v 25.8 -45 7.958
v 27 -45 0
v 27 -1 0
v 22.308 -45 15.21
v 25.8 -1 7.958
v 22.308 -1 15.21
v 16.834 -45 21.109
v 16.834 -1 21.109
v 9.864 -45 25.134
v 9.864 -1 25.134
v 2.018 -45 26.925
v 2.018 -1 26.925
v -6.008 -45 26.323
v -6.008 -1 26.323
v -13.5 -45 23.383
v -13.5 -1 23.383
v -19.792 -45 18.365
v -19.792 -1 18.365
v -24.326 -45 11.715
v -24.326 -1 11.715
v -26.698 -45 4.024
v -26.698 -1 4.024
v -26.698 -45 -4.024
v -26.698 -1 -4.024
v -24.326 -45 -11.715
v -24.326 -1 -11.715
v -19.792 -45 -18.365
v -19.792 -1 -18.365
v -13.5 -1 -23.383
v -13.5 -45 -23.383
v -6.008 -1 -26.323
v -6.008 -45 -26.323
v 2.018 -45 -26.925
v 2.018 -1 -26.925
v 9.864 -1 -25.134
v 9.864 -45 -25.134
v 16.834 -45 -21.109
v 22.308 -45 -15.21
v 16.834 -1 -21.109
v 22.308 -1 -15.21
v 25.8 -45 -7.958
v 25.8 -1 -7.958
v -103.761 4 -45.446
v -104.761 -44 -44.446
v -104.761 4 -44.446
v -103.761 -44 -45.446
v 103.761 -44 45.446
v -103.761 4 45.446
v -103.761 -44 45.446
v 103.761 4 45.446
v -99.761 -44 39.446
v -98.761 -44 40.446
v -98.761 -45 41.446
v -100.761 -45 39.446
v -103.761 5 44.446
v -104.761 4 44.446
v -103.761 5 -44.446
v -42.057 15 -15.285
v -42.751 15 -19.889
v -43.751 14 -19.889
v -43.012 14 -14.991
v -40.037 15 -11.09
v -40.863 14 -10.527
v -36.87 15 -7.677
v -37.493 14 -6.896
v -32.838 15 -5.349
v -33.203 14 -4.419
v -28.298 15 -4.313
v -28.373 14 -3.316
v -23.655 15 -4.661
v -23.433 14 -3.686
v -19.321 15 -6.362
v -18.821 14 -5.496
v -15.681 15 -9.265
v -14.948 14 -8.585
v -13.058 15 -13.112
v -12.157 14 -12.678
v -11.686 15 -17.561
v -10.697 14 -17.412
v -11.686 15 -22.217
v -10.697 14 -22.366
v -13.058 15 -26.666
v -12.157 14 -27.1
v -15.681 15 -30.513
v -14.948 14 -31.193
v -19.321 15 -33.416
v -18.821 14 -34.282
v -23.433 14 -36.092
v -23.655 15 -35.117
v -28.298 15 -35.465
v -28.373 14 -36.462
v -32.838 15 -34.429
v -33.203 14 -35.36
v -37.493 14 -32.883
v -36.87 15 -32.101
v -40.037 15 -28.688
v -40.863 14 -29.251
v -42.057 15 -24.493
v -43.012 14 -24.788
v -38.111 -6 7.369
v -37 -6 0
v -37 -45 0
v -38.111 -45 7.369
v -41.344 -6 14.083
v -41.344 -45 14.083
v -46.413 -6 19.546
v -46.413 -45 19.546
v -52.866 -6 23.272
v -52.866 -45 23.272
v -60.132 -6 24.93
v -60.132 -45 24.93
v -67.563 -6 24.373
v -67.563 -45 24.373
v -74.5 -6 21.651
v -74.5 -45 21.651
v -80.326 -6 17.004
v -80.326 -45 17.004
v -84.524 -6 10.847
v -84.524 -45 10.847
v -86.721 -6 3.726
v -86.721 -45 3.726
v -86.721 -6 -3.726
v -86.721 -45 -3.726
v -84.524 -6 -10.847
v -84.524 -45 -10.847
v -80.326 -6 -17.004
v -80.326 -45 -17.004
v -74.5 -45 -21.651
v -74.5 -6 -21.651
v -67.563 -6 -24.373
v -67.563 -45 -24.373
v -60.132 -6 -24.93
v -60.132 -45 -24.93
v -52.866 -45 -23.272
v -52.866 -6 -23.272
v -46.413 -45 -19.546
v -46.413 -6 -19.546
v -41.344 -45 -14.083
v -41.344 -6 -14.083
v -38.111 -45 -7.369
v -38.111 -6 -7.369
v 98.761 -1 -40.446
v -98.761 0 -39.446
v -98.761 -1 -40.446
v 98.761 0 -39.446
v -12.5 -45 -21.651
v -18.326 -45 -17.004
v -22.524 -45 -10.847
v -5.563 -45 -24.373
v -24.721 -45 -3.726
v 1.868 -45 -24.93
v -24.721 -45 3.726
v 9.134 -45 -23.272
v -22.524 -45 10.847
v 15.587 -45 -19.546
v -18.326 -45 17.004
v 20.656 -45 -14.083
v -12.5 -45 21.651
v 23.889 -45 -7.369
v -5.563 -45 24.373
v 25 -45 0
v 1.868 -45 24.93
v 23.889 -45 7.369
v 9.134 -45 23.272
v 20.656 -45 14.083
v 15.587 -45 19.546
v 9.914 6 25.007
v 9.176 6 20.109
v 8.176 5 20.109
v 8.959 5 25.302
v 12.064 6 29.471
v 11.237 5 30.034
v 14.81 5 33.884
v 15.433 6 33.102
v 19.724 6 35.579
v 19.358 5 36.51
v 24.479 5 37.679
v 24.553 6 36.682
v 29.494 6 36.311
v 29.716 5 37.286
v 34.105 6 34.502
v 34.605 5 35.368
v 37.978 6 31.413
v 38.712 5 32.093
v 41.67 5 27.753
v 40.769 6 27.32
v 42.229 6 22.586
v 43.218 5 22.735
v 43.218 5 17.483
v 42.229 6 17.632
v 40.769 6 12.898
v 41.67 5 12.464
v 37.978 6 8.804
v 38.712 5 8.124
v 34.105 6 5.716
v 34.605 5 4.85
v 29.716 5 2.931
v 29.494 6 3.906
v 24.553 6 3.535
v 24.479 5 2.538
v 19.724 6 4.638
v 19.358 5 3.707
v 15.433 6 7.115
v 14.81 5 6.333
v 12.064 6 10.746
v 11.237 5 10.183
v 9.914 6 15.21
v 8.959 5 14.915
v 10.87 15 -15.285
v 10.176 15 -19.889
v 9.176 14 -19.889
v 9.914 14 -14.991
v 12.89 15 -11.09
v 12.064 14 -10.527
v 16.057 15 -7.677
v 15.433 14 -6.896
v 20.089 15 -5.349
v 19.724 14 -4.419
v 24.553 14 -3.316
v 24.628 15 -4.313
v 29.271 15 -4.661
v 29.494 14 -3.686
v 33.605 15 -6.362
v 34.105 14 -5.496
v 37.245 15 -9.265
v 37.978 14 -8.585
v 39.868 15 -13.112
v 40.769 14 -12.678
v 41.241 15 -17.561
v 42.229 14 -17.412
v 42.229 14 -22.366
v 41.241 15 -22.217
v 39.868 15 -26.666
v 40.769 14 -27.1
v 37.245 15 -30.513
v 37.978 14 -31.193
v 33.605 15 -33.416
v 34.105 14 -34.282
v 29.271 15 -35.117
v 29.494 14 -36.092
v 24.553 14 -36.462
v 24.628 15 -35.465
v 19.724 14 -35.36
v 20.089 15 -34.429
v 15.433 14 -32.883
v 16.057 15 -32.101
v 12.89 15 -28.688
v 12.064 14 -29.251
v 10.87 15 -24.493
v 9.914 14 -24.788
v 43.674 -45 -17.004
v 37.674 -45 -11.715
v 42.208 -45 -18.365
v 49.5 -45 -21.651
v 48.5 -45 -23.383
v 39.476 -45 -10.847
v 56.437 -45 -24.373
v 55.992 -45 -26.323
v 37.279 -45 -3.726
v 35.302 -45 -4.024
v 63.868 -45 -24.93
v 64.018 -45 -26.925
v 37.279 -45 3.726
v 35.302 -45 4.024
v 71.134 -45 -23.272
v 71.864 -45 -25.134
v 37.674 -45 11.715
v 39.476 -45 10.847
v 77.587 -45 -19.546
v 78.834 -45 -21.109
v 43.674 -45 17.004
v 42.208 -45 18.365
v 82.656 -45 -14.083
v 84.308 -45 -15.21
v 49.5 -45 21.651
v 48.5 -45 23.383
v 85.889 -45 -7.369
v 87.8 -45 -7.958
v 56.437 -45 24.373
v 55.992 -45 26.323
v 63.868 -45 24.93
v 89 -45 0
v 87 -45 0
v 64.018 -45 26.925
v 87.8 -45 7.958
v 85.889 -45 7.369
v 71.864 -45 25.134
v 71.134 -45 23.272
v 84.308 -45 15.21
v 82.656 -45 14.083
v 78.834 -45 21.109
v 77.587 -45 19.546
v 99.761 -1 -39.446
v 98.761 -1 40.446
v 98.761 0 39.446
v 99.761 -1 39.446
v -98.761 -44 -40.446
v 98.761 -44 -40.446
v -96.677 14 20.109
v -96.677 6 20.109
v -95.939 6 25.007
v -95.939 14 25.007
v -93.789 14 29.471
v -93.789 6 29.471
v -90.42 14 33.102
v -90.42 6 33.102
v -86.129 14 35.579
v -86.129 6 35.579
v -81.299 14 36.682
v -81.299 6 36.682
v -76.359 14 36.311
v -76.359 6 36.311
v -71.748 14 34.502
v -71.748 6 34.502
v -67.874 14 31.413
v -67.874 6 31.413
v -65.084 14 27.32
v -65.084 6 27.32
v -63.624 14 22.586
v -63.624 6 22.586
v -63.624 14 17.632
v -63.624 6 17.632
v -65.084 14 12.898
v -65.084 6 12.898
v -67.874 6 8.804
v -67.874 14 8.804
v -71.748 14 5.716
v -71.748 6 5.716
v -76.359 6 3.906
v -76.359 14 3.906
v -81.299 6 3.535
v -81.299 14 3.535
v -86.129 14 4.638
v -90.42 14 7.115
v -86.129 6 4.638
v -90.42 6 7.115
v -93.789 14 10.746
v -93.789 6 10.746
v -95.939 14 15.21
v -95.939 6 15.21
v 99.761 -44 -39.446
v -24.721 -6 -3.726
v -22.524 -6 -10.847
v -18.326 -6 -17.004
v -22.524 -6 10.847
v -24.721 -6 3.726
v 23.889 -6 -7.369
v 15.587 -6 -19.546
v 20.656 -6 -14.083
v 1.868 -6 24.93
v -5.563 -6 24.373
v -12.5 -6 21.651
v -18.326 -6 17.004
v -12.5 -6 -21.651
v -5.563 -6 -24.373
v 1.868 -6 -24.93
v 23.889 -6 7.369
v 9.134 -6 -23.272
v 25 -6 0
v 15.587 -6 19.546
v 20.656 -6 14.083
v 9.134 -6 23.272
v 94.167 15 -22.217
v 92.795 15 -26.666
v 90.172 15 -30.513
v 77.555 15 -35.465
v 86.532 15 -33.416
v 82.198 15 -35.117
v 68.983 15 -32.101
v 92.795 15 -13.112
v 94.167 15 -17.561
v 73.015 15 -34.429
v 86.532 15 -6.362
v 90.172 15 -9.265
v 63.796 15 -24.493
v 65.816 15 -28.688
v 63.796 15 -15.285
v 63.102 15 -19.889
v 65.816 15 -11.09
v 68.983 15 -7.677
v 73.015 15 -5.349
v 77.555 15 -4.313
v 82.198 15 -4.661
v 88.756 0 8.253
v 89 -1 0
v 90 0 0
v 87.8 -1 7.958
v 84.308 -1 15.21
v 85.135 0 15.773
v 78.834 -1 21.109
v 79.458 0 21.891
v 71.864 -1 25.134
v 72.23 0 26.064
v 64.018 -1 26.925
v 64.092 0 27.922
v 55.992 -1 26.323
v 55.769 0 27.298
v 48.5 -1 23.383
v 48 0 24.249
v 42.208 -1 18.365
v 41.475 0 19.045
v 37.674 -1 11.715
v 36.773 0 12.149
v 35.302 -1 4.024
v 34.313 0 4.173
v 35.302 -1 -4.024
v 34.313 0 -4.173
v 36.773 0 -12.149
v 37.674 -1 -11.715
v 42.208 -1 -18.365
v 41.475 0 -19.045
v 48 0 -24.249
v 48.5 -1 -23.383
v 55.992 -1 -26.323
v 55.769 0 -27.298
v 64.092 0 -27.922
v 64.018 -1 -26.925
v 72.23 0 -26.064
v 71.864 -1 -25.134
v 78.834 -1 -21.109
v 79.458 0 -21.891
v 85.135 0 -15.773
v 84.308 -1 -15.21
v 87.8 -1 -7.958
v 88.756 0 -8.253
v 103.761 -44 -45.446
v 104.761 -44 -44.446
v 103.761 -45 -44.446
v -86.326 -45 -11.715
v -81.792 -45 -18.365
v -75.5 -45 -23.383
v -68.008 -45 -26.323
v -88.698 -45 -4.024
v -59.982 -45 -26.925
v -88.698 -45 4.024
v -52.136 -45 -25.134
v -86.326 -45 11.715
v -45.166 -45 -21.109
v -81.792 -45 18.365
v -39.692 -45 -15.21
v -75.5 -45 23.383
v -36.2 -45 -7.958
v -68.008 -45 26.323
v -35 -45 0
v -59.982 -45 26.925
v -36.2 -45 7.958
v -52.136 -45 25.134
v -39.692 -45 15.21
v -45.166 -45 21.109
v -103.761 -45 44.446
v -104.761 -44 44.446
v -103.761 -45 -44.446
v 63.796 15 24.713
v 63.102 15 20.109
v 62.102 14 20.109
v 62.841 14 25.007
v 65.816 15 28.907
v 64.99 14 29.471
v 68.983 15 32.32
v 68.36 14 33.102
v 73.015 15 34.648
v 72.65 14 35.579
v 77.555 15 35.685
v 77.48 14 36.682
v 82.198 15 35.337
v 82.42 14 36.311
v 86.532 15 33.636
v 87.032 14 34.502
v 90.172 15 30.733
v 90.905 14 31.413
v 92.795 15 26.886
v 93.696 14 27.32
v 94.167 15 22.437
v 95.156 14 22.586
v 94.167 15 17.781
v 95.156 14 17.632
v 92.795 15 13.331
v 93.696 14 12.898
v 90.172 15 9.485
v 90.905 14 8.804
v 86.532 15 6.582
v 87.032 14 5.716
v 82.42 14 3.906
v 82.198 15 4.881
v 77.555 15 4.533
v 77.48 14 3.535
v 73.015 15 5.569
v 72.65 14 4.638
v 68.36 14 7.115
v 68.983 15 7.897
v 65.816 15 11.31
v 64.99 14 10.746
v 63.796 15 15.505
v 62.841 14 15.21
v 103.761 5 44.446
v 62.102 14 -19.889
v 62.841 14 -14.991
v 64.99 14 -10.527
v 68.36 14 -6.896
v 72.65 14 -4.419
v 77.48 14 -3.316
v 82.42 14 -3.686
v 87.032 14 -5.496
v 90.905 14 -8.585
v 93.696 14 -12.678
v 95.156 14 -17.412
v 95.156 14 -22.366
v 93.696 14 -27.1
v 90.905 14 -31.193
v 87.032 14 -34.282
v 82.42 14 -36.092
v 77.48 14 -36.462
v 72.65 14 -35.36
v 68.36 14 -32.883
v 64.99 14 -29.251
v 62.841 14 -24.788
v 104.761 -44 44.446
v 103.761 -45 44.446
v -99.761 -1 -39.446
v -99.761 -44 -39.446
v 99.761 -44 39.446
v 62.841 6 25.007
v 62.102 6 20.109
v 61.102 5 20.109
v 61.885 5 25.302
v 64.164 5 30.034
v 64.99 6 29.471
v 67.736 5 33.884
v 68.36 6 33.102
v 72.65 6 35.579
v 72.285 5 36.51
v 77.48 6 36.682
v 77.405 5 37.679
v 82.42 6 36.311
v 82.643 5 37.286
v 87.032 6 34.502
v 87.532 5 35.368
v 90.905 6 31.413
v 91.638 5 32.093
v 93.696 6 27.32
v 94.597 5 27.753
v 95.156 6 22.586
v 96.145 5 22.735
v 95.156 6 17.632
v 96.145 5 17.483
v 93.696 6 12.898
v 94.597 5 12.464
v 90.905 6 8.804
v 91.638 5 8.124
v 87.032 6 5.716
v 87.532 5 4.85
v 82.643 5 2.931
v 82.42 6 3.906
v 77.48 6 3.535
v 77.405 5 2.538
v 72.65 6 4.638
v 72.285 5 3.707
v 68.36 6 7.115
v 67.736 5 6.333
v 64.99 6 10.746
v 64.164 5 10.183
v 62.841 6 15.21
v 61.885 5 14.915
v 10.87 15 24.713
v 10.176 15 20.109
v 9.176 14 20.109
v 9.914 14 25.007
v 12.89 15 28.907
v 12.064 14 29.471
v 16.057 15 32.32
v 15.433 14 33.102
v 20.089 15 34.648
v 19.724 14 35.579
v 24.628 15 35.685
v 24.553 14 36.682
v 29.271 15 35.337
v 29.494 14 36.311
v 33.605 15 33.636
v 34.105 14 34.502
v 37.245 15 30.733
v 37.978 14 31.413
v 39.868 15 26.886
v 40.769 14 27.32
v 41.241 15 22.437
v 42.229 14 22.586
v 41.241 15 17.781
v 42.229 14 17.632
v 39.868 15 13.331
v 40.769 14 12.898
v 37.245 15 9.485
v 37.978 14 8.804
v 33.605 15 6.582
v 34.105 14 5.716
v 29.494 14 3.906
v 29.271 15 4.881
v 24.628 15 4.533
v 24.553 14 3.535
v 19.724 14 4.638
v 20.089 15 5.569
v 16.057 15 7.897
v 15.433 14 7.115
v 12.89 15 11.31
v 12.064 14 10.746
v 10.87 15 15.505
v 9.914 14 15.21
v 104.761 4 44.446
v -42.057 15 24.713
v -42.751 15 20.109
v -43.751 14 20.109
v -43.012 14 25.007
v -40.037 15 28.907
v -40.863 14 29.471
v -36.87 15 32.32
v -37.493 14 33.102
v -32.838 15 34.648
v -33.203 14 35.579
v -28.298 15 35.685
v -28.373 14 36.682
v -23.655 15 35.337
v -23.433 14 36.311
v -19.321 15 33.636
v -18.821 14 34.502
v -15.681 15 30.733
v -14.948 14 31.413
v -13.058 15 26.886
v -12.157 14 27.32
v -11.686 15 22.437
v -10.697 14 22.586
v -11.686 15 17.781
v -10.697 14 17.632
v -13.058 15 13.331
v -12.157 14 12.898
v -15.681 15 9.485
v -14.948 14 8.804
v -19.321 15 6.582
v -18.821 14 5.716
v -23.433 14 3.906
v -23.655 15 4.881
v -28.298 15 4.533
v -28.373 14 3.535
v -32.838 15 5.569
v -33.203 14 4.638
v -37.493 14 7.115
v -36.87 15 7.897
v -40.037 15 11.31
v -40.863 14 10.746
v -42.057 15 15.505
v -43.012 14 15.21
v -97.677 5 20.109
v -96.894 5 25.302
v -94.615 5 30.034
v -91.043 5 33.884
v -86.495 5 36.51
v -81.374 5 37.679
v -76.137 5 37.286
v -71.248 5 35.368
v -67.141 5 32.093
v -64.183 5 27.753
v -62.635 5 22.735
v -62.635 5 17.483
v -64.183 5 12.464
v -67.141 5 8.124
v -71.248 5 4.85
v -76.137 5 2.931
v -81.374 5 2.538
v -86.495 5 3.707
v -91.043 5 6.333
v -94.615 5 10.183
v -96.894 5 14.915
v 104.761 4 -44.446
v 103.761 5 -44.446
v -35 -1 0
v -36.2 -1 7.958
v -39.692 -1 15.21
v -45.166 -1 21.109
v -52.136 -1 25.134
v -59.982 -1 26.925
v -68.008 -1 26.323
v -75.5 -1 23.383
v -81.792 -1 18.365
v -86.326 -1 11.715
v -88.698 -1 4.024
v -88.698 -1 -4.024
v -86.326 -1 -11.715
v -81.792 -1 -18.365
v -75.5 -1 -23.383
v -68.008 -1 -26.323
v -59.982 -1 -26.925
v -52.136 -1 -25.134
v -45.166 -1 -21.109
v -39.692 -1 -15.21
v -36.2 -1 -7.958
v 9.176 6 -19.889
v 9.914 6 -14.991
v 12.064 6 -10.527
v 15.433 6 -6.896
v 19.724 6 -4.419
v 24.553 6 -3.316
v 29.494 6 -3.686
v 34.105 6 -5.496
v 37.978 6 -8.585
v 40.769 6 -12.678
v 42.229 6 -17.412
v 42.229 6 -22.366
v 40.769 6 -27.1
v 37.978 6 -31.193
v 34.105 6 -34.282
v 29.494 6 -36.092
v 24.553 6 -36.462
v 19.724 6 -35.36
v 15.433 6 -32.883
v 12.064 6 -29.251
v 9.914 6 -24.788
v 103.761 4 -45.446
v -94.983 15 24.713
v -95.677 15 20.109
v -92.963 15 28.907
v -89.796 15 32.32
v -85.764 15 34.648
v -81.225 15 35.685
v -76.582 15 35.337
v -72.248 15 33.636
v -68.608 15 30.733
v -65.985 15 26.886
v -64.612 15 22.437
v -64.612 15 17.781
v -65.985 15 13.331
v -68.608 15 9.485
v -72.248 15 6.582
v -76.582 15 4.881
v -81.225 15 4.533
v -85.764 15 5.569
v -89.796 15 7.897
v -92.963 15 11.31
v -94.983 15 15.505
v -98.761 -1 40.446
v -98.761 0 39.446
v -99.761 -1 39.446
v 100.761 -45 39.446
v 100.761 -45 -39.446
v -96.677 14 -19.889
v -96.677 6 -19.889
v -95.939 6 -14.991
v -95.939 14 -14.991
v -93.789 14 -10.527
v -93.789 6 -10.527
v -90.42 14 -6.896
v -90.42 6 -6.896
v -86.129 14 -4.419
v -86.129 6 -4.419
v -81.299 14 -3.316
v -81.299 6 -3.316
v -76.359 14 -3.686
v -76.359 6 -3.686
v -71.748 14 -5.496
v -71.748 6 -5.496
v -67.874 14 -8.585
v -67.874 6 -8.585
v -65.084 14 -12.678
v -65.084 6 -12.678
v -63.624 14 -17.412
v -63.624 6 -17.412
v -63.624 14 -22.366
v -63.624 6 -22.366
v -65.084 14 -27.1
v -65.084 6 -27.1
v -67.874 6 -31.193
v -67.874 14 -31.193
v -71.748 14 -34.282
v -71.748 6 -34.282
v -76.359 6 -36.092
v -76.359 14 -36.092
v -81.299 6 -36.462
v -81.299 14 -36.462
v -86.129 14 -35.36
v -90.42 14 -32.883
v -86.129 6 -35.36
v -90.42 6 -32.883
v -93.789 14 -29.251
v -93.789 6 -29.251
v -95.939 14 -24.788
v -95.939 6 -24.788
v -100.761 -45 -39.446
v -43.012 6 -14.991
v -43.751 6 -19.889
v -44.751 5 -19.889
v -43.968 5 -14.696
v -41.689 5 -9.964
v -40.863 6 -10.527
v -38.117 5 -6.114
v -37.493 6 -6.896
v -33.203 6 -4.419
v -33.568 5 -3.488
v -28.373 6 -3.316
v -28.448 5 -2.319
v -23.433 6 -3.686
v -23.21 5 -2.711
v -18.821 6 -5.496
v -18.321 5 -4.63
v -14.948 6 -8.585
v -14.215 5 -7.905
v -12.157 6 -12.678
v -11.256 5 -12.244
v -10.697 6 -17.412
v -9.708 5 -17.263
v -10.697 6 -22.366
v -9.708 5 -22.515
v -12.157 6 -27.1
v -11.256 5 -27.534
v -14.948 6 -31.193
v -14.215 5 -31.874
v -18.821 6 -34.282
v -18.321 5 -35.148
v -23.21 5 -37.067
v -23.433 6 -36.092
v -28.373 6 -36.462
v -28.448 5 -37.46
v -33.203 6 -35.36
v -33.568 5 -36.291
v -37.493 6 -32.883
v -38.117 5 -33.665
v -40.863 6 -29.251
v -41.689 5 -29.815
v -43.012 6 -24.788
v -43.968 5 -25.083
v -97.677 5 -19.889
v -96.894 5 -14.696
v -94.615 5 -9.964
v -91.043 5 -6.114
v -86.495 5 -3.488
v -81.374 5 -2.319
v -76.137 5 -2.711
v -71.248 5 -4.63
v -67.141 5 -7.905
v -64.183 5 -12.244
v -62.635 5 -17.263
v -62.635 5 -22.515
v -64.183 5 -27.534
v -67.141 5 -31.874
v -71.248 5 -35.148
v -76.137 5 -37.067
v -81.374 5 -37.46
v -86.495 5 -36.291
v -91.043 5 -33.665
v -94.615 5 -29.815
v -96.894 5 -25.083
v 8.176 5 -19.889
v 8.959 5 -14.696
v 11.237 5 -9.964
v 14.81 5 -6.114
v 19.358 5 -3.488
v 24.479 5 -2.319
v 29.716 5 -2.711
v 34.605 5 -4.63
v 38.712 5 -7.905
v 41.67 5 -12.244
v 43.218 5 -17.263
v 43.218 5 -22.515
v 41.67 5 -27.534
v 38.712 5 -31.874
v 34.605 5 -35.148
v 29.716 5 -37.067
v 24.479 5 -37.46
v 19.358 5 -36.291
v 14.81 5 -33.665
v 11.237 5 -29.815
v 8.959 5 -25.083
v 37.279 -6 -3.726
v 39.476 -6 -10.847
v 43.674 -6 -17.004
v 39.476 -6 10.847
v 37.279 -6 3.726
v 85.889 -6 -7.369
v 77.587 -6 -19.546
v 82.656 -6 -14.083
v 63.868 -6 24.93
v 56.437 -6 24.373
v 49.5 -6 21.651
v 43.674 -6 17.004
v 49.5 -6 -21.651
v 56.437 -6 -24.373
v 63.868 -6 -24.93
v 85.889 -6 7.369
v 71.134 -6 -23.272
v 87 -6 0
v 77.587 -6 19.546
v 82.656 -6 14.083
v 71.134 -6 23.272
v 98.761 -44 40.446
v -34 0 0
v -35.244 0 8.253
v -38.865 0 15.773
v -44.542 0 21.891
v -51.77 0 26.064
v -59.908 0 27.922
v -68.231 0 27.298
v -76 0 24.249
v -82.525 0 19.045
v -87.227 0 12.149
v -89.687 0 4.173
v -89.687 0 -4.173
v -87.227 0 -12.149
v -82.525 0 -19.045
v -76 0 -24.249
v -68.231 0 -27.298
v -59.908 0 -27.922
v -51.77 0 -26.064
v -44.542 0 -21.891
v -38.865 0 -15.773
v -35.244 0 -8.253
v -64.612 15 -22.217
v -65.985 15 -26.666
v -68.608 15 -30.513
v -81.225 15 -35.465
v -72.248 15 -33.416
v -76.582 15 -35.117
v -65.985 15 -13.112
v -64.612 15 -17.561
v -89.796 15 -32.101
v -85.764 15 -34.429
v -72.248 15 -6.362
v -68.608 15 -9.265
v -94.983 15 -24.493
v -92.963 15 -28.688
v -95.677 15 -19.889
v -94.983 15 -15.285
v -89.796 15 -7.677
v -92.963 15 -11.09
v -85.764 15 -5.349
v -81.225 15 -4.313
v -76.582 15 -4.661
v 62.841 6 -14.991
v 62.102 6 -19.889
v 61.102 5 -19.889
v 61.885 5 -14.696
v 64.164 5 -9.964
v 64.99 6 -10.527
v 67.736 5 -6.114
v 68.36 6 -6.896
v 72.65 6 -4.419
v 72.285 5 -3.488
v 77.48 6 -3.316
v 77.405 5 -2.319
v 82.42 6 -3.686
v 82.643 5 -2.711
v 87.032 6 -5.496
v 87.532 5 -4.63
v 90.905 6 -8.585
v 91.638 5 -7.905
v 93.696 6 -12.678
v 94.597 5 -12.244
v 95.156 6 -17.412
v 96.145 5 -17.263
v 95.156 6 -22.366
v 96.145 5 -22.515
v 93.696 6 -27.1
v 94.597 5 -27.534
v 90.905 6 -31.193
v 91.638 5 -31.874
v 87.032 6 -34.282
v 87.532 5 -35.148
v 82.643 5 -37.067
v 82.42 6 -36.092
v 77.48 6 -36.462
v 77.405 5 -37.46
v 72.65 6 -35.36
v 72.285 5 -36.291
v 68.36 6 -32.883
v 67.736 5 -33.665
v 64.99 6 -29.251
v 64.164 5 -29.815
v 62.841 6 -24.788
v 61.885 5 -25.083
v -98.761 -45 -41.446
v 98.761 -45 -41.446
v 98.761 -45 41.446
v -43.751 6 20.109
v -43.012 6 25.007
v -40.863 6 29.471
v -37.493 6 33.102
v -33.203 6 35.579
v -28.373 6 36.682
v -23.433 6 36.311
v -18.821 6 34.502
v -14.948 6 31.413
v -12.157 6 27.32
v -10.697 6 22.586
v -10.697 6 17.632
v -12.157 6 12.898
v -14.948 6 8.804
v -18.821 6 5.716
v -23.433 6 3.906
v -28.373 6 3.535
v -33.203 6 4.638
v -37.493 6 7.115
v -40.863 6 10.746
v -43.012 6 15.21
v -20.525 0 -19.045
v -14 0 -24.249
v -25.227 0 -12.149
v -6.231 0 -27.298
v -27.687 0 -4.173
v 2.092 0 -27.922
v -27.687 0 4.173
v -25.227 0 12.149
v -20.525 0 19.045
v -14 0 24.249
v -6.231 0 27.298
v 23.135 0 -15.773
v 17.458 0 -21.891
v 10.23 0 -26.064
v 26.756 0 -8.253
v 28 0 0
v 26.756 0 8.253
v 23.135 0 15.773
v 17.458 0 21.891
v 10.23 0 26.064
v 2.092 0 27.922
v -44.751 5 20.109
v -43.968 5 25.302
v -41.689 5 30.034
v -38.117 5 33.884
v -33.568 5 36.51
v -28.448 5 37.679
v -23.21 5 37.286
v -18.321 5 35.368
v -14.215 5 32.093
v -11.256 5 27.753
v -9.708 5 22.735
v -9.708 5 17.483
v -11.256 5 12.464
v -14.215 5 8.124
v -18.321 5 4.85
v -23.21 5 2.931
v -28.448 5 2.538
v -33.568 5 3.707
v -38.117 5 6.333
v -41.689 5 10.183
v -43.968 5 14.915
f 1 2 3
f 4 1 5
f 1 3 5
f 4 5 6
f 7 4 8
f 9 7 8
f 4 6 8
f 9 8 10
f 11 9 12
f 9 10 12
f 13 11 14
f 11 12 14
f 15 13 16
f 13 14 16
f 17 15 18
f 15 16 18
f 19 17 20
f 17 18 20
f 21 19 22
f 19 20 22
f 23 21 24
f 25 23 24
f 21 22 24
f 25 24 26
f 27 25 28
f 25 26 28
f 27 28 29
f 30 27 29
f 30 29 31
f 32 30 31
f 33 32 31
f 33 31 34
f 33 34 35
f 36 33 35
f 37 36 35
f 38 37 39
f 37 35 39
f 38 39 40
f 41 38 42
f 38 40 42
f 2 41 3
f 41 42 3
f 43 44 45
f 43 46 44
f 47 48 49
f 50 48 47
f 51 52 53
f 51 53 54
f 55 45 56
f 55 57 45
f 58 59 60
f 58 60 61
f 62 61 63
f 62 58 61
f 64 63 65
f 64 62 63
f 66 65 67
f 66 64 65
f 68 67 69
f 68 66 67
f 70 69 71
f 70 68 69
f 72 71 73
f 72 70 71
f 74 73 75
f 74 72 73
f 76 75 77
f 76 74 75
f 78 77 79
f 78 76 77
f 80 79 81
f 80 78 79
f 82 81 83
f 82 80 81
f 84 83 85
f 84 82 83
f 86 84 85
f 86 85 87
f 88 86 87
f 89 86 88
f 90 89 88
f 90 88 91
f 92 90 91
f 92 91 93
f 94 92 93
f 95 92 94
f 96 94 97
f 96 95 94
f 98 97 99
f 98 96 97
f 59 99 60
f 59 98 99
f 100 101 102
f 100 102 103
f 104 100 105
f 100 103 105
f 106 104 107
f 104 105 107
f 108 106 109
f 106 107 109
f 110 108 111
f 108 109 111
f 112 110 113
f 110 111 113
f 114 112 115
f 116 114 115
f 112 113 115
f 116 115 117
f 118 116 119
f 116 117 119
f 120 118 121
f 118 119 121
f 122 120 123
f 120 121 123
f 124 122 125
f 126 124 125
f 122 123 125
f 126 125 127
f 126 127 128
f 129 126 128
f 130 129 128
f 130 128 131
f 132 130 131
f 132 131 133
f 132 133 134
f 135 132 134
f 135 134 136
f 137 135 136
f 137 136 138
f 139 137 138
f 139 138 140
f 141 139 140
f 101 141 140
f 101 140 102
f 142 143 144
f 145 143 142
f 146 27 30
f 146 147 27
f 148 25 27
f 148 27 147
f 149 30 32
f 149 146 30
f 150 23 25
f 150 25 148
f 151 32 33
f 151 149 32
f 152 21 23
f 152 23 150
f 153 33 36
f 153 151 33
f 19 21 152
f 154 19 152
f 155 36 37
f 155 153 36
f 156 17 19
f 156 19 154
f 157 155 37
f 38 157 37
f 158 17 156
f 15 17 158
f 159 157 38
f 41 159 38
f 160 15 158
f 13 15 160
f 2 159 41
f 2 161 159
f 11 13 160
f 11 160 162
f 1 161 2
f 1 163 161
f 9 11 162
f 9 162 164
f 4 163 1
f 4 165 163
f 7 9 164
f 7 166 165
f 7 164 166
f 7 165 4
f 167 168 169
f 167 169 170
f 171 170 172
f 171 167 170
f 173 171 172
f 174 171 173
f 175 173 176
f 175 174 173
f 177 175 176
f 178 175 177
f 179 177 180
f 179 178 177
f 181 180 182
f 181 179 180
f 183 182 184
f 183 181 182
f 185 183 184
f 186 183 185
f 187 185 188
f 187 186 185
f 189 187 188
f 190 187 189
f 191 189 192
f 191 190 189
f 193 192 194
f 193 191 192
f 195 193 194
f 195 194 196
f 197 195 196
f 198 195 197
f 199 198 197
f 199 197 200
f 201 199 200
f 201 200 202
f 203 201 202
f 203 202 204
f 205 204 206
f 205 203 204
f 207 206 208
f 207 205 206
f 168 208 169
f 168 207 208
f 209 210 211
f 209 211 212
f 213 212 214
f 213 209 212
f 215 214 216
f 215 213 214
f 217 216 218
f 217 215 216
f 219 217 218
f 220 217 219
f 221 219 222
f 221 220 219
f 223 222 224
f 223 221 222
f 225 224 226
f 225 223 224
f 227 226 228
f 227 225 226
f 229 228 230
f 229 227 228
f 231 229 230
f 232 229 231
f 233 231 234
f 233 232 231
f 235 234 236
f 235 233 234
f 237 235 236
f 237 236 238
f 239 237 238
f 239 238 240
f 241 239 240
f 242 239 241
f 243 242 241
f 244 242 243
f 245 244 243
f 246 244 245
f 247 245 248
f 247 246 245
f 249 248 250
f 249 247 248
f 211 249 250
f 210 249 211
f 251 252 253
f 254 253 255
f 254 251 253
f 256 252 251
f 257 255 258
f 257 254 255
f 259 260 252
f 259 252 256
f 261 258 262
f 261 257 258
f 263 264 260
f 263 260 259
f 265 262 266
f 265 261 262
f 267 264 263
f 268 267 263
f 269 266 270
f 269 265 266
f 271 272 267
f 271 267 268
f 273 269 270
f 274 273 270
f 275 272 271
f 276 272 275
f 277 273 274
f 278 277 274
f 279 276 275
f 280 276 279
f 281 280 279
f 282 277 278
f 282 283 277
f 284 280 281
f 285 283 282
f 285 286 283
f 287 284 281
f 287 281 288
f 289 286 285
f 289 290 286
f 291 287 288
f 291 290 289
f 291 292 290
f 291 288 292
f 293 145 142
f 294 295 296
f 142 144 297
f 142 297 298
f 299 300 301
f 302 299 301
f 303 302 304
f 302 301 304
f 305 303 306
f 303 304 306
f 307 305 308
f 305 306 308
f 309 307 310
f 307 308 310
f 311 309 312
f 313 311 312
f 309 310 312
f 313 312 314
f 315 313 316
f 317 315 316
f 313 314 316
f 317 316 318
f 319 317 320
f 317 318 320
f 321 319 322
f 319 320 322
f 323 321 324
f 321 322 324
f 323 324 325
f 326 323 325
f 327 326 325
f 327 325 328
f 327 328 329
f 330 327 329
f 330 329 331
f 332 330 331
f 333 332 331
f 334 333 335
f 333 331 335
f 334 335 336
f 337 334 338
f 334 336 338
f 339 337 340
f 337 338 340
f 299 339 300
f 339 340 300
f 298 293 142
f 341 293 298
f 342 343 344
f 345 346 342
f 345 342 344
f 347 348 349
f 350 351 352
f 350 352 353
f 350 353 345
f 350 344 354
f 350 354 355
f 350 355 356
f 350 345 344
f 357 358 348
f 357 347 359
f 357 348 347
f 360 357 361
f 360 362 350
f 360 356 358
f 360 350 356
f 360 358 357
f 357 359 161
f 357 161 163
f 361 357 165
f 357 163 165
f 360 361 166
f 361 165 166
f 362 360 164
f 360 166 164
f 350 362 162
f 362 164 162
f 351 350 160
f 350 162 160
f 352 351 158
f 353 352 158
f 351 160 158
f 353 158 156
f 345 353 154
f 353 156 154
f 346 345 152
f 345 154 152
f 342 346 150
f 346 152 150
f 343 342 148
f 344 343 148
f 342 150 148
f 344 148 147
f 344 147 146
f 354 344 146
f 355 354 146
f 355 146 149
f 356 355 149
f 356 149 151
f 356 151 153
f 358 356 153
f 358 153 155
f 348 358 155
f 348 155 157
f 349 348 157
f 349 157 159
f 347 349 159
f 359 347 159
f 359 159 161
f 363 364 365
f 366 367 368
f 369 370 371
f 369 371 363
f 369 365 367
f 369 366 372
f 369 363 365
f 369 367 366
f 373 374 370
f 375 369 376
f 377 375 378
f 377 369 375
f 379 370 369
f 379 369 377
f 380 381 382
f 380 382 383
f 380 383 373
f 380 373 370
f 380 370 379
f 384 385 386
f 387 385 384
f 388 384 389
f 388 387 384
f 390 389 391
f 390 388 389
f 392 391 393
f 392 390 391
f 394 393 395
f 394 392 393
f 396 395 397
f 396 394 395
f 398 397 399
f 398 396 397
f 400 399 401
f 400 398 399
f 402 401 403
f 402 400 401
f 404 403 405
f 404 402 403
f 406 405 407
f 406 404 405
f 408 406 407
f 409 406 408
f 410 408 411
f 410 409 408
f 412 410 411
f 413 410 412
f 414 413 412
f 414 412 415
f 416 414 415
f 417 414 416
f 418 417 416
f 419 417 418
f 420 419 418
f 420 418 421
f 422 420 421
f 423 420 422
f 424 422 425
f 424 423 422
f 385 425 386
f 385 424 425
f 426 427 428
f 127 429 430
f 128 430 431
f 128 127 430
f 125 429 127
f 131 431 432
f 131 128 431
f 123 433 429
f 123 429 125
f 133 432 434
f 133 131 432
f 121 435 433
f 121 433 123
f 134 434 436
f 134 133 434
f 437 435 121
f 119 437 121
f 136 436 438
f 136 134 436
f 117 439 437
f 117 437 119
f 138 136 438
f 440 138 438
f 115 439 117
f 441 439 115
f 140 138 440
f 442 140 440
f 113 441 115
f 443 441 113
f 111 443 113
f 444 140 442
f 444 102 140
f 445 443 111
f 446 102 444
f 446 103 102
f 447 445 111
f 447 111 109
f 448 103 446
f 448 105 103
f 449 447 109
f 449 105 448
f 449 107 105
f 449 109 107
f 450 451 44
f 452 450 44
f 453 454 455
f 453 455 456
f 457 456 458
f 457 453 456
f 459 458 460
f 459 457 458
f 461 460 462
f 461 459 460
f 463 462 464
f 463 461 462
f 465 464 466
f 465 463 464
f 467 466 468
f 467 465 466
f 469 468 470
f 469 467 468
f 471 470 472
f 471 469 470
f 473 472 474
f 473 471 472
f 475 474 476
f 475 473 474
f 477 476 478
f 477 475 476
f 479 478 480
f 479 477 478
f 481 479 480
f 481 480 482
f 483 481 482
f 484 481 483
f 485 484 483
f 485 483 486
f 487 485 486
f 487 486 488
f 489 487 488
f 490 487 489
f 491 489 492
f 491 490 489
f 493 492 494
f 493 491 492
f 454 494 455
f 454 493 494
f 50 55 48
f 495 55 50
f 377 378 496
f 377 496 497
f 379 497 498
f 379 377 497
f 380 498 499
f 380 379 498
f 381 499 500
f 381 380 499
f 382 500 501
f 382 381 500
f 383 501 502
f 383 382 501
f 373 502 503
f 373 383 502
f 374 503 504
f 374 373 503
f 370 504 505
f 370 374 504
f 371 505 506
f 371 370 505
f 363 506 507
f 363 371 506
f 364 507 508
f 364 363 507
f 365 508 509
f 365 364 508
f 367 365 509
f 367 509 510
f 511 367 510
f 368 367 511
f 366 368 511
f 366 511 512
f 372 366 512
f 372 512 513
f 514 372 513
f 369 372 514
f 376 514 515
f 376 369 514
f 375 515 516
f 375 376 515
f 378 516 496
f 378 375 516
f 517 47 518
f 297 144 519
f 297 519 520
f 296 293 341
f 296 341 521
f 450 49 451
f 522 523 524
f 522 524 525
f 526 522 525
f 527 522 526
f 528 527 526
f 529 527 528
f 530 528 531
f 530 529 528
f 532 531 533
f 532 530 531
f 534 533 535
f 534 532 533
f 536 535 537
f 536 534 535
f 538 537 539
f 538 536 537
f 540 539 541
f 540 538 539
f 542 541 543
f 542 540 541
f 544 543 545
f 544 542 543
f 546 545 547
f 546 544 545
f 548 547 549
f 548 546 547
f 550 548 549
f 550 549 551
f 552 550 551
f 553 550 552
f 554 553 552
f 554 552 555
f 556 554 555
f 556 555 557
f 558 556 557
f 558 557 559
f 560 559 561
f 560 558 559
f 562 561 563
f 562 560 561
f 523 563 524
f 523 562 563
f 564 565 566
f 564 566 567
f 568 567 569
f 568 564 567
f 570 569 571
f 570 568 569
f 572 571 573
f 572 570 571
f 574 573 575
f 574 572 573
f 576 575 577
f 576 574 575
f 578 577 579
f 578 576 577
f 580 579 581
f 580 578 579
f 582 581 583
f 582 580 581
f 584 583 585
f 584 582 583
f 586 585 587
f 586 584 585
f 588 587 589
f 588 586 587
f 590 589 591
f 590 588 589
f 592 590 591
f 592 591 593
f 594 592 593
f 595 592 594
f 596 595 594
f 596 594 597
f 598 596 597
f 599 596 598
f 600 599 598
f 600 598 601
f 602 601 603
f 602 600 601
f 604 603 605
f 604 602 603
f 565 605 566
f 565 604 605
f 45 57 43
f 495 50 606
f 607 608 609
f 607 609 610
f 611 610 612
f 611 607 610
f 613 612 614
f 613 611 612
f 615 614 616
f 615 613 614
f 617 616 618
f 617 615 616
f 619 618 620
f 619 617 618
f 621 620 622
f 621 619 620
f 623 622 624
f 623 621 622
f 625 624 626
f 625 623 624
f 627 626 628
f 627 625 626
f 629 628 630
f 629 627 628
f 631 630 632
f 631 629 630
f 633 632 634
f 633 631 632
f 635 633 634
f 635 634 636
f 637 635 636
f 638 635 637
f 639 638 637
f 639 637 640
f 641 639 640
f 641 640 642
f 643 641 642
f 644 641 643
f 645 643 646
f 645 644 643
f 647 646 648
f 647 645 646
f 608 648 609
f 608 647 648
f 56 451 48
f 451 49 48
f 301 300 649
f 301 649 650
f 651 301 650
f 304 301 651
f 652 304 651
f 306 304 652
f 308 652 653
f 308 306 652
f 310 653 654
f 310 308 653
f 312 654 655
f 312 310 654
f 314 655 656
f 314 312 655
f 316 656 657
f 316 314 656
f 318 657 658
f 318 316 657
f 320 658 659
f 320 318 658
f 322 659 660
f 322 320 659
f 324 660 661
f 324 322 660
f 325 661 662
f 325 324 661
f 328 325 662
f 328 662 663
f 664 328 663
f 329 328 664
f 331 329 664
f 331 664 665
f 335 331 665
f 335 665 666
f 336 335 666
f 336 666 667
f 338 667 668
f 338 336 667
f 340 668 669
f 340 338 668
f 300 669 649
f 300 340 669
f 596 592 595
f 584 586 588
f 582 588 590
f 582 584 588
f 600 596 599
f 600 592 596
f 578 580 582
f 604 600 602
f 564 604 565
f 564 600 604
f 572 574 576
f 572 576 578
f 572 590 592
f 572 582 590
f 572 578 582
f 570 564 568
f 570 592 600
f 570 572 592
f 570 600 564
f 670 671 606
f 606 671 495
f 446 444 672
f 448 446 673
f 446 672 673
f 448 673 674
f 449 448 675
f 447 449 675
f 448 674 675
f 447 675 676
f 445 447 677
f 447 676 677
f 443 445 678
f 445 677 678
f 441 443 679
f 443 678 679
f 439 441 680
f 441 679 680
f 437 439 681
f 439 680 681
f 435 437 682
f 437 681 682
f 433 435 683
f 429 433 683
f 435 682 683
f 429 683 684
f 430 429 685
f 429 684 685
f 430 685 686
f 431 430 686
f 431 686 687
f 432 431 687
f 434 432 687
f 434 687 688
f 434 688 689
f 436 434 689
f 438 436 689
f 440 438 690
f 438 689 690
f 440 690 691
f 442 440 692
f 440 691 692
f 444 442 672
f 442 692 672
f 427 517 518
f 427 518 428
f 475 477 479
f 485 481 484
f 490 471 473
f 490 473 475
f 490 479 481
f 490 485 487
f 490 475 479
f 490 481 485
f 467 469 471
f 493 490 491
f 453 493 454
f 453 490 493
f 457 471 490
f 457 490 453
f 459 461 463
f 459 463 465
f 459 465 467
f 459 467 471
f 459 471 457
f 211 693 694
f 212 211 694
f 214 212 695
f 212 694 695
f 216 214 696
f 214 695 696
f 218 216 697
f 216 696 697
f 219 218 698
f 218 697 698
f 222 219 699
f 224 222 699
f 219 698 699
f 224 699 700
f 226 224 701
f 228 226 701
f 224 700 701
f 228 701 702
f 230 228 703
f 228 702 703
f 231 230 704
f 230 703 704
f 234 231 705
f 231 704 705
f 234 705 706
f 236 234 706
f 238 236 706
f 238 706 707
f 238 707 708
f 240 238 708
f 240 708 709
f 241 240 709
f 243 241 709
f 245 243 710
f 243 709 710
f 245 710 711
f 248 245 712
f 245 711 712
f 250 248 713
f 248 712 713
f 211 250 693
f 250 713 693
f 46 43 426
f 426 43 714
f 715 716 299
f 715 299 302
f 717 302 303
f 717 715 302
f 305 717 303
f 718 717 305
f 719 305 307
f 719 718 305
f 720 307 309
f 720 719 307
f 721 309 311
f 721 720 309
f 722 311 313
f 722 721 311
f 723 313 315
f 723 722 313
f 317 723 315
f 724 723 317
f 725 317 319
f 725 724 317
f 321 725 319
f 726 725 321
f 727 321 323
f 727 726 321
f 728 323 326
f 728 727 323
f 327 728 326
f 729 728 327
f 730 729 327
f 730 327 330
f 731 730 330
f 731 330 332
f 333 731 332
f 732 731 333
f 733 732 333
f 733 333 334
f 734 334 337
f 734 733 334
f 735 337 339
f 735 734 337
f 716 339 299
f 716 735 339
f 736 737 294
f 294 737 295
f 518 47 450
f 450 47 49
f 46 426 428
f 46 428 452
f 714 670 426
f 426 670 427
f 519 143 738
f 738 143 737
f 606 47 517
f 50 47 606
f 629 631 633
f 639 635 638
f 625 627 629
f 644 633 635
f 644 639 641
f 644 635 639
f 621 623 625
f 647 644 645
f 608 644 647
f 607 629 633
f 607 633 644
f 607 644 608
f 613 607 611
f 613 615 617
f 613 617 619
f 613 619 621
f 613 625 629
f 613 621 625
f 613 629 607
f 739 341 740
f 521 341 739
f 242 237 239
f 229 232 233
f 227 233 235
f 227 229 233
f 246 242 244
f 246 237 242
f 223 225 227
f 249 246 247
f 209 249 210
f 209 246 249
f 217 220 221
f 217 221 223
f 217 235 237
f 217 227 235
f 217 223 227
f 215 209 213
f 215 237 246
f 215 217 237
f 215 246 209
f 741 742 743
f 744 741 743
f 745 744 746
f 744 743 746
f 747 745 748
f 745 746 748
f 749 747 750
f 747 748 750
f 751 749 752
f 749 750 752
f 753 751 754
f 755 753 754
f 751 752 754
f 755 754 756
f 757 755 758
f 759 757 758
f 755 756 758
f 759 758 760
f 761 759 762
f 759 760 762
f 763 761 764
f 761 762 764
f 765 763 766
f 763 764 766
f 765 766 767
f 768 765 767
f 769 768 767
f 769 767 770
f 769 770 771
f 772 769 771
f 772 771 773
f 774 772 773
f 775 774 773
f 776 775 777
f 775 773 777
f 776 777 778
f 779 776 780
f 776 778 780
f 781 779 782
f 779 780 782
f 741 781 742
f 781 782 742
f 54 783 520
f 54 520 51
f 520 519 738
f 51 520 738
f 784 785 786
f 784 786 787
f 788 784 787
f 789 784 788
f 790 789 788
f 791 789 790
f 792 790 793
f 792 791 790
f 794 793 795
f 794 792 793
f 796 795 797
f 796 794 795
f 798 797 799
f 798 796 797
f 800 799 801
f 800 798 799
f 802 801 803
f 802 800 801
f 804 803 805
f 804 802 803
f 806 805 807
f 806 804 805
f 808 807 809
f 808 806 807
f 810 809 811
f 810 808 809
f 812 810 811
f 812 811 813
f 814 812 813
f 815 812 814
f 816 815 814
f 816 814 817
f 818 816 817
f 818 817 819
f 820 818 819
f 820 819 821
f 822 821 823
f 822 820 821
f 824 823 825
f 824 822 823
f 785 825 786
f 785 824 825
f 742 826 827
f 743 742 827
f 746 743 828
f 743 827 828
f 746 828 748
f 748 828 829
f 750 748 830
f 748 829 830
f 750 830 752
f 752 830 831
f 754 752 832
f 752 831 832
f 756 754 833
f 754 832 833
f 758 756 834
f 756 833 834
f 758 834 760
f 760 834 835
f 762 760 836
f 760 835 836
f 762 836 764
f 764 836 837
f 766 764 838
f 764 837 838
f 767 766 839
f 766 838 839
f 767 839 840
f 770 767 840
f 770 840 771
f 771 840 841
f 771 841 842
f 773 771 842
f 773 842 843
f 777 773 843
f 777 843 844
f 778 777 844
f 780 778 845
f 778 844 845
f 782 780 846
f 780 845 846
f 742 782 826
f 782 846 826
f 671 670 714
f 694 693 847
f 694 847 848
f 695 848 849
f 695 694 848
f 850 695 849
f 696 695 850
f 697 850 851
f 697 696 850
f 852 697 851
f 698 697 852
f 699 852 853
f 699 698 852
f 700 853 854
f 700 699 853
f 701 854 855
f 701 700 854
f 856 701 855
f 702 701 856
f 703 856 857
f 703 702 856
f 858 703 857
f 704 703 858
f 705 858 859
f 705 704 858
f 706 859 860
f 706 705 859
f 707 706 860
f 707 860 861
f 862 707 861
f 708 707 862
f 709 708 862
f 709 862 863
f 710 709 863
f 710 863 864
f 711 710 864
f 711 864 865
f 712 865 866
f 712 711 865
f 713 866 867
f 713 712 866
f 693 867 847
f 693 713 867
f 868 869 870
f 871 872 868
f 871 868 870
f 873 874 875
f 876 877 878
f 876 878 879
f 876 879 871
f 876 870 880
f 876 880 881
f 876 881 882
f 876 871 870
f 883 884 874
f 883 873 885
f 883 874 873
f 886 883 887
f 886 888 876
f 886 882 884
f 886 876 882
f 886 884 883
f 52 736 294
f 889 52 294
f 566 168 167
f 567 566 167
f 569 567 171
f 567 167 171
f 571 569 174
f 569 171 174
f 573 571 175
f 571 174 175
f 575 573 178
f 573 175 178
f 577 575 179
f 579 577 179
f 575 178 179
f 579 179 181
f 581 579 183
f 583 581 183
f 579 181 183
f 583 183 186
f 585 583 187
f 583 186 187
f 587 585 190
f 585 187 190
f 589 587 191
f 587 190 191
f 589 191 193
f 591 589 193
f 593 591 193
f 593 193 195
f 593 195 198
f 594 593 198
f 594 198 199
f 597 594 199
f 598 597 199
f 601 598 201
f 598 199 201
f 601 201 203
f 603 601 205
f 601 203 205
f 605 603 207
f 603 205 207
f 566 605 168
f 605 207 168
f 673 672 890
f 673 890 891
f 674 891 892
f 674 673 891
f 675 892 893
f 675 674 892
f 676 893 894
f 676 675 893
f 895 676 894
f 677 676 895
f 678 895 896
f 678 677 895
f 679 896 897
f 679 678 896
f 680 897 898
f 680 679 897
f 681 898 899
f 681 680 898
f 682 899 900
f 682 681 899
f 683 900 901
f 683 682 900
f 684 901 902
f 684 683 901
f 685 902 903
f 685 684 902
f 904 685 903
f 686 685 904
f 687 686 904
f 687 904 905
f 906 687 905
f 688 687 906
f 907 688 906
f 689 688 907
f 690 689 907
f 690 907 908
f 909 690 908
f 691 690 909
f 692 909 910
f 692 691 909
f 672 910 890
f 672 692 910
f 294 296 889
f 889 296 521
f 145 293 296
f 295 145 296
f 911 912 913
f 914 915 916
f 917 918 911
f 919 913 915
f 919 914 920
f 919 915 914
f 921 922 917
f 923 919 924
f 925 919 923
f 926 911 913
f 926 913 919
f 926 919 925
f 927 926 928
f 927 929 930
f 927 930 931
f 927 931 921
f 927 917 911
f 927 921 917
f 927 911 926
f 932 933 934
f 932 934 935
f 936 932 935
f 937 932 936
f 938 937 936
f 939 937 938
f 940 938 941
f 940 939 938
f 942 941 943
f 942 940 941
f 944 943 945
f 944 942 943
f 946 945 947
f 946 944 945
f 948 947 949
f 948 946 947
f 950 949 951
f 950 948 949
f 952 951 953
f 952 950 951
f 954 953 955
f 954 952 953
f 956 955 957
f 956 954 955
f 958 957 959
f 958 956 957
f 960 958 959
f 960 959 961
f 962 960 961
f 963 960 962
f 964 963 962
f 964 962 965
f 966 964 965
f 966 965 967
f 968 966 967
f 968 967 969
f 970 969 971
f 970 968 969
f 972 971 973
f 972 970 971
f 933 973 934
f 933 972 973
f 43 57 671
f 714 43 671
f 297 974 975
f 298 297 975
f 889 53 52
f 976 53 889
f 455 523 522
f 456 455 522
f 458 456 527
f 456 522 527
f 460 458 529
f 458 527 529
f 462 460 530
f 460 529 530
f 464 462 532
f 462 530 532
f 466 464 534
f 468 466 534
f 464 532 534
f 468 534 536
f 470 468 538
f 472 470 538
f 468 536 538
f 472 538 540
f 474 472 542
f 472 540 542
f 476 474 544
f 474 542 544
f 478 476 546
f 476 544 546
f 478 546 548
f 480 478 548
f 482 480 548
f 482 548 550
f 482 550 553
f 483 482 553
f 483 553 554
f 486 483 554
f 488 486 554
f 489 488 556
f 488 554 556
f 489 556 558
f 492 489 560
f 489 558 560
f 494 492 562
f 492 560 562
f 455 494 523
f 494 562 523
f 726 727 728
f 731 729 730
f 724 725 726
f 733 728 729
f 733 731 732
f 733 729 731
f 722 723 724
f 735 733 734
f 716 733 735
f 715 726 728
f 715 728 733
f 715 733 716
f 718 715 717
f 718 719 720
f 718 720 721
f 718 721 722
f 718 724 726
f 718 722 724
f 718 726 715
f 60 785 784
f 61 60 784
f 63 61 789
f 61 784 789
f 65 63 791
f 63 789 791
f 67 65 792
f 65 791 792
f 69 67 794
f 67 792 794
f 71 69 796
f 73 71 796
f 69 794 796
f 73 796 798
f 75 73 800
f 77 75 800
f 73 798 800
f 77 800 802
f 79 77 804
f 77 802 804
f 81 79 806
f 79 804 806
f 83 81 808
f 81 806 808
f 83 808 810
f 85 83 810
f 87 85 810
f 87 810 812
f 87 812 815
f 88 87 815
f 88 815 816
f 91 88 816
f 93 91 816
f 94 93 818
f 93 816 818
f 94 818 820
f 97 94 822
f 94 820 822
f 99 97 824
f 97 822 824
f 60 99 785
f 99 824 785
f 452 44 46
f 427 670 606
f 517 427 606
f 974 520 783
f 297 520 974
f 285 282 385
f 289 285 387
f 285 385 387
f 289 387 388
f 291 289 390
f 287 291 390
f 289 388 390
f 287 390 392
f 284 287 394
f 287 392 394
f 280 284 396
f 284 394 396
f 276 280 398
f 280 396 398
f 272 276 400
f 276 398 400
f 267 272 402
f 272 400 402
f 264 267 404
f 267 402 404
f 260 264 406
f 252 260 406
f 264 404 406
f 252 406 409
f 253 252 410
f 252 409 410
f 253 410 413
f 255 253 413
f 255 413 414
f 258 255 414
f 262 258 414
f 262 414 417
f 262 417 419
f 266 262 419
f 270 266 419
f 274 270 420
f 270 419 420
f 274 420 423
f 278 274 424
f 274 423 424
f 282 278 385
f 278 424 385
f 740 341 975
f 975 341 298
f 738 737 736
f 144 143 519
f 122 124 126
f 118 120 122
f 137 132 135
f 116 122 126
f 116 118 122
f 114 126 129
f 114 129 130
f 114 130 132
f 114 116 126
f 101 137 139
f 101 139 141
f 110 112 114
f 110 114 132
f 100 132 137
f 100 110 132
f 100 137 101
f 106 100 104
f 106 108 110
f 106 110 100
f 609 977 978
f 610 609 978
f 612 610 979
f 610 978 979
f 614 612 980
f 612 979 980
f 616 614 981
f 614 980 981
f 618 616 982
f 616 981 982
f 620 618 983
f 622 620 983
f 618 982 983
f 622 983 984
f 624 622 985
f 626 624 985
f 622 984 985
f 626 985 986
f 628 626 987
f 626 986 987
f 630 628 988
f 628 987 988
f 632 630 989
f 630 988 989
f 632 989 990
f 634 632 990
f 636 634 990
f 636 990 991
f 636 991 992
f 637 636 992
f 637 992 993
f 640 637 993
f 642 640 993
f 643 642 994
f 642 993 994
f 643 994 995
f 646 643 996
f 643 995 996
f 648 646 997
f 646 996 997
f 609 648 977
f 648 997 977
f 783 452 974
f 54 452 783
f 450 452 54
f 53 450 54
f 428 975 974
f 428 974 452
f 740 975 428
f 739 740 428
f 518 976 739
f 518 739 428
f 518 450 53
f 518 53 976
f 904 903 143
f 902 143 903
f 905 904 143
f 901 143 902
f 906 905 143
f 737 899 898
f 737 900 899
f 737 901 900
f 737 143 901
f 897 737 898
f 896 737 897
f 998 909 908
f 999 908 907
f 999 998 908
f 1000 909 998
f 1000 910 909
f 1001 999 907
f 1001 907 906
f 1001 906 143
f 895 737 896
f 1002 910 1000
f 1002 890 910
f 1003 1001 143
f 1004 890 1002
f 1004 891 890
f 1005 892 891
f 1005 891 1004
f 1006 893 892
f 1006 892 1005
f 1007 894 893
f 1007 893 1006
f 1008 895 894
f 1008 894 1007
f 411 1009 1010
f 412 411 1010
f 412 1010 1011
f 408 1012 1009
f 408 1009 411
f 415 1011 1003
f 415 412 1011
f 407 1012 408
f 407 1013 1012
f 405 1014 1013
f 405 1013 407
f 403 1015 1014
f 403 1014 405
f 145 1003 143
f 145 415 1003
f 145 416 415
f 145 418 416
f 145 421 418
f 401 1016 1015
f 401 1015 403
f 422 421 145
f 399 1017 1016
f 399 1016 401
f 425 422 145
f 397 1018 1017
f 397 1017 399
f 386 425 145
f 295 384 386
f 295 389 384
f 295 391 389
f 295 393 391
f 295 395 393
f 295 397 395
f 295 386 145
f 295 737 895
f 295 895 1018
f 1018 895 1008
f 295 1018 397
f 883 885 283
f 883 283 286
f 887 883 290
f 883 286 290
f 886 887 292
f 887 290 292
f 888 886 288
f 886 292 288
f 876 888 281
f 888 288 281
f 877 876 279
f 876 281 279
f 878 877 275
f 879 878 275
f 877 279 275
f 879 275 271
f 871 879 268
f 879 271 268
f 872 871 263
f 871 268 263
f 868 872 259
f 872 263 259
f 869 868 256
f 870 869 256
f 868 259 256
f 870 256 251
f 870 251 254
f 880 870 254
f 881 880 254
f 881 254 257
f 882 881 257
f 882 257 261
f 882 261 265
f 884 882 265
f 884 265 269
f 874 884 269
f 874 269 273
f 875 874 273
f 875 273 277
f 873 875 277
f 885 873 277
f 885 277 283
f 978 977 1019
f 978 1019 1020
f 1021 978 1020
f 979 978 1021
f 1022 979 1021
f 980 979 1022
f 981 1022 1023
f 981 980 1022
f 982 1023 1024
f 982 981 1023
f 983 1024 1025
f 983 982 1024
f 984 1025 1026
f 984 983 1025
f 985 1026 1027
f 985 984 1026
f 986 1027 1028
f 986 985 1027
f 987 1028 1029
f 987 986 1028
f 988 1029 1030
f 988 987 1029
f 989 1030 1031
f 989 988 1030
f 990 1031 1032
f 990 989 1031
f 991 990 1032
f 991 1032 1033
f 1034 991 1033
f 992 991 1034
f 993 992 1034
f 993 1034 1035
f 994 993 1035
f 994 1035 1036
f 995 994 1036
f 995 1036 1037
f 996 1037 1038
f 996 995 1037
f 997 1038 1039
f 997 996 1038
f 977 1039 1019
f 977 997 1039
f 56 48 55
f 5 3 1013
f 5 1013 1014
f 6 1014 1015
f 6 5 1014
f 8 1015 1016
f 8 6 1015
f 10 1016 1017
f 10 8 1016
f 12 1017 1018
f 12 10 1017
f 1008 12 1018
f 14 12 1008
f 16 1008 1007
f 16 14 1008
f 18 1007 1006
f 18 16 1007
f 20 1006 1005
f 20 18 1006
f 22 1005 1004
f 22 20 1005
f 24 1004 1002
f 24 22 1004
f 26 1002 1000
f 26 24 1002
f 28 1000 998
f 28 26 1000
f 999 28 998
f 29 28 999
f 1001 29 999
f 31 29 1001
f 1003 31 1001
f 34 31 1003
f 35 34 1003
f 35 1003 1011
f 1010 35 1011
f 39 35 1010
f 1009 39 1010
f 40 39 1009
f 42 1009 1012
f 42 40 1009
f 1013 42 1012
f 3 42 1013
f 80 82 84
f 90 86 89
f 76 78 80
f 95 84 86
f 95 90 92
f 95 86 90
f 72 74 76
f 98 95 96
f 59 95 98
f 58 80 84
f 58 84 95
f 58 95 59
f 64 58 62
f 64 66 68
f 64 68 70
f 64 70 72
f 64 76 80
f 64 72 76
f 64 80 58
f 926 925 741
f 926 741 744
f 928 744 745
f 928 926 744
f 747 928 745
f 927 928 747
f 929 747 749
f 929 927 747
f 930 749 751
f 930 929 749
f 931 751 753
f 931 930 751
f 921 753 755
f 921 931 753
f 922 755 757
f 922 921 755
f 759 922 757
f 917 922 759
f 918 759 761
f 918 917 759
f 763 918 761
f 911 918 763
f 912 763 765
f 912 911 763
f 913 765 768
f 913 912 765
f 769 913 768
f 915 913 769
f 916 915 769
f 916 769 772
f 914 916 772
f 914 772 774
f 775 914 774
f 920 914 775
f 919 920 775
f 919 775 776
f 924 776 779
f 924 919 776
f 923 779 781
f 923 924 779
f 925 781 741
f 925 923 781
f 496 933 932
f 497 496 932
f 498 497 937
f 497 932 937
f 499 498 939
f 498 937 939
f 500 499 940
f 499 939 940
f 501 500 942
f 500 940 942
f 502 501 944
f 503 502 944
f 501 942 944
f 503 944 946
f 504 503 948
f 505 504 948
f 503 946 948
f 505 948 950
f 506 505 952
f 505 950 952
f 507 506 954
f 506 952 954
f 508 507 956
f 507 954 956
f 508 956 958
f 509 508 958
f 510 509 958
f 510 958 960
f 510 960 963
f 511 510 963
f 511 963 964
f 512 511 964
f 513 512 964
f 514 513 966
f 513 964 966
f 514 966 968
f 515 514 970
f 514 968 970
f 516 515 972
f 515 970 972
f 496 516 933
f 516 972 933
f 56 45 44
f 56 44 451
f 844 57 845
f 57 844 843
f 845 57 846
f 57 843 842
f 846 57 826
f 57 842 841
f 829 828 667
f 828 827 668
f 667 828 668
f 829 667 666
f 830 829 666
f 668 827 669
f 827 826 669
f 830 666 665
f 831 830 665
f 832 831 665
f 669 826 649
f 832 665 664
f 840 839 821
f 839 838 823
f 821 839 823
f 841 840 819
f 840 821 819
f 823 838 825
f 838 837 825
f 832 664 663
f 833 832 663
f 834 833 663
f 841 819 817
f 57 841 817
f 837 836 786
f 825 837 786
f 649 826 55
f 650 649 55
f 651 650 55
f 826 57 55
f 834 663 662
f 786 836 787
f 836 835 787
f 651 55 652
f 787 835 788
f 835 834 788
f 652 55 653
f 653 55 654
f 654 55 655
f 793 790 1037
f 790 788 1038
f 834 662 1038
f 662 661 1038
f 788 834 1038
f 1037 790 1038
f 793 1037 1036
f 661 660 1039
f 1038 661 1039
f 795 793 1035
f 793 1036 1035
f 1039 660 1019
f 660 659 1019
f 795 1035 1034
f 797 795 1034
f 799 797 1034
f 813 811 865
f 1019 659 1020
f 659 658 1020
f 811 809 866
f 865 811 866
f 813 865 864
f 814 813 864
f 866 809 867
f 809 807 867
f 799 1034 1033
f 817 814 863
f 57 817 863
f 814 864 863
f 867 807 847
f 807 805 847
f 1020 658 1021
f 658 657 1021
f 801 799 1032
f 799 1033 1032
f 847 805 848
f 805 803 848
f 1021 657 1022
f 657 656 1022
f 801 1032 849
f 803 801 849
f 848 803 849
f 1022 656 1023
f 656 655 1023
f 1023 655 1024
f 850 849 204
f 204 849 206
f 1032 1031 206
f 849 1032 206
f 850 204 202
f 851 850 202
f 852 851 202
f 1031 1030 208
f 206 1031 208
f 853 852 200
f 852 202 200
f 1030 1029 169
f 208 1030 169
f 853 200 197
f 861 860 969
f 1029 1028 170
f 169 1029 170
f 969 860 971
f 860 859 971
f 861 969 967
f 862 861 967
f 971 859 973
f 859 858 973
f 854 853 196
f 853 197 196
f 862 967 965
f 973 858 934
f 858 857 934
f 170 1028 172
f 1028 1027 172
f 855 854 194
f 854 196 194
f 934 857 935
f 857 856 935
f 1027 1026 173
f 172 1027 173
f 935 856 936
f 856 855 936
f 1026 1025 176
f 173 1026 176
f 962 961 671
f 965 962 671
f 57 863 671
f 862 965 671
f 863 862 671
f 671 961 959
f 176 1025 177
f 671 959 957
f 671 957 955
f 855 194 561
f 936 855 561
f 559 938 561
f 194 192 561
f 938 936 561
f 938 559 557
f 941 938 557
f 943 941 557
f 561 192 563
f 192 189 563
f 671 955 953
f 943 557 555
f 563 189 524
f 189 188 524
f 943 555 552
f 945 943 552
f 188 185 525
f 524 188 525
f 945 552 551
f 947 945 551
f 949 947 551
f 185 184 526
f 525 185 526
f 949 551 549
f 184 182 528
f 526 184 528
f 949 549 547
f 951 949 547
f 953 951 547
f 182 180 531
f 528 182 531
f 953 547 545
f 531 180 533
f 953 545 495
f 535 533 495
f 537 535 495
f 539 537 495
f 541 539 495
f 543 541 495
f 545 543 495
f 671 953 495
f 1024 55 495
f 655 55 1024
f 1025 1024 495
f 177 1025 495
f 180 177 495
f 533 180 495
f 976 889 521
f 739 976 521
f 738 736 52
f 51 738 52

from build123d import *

# Parameters (mm, degrees)
SKETCH_W        = 199.522308
SKETCH_H        = 80.891732
PAD_DEPTH       = 45
THICKNESS_T     = 5
SKETCH001_R     = 27
PAD001_DEPTH    = 45
SKETCH002_R     = 25
POCKET_DEPTH    = 40
CHAMFER_SIZE    = 1
CHAMFER001_SIZE = 1
SKETCH003_R     = 16.619599
PAD002_DEPTH    = 10
CHAMFER002_SIZE = 1
CHAMFER003_SIZE = 1


with BuildPart() as part:
    # Sketch → Pad (new body)
    with BuildSketch(Plane.XZ):
        Rectangle(SKETCH_W, SKETCH_H)
    extrude(amount=PAD_DEPTH)

    # Thickness
    thickness_openings = [part.faces().sort_by_distance(p)[0] for p in [
        (0, -45, 0),
    ]]
    offset(amount=THICKNESS_T, openings=thickness_openings, kind=Kind.INTERSECTION)

    # Sketch001 (on Face5 of Thickness) → Pad001 (join)
    with BuildSketch(Plane.XZ):
        Circle(SKETCH001_R)
        with Locations((62, 0)):
            Circle(SKETCH001_R)
        with Locations((-62, 0)):
            Circle(SKETCH001_R)
    extrude(amount=PAD001_DEPTH)

    # Sketch002 → Pocket (cut)
    with BuildSketch(Plane.XZ.offset(46)):
        Circle(SKETCH002_R)
        with Locations((-62, 0)):
            Circle(SKETCH002_R)
        with Locations((62, 0)):
            Circle(SKETCH002_R)
    extrude(amount=-POCKET_DEPTH, mode=Mode.SUBTRACT)

    # Chamfer
    chamfer_edges = [part.edges().sort_by_distance(p)[0] for p in [
        (-99.761154, 0, 0),
        (0, 0, -40.445866),
        (0, 0, 40.445866),
        (99.761154, 0, 0),
        (-89, 0, 0),
        (-27, 0, 0),
        (35, 0, 0),
        (-99.761154, -22.5, 40.445866),
        (99.761154, -22.5, 40.445866),
        (0, -45, 40.445866),
        (-99.761154, -22.5, -40.445866),
        (-99.761154, -45, 0),
        (99.761154, -22.5, -40.445866),
        (99.761154, -45, 0),
        (0, -45, -40.445866),
    ]]
    chamfer(chamfer_edges, length=CHAMFER_SIZE)

    # Chamfer001
    chamfer001_edges = [part.edges().sort_by_distance(p)[0] for p in [
        (104.761154, -20, 45.445866),
        (0, 5, 45.445866),
        (-104.761154, -20, 45.445866),
        (0, -45, 45.445866),
        (104.761154, -20, -45.445866),
        (104.761154, 5, 0),
        (104.761154, -45, 0),
        (-104.761154, 5, 0),
        (0, 5, -45.445866),
        (-104.761154, -20, -45.445866),
        (-104.761154, -45, 0),
        (0, -45, -45.445866),
    ]]
    chamfer(chamfer001_edges, length=CHAMFER001_SIZE)

    # Sketch003 (on Face48 of Chamfer001) → Pad002 (join)
    with BuildSketch(Plane(origin=(0, 5, 0), x_dir=(-1, 0, 0), z_dir=(0, 1, 0))):
        with Locations((-78.721924, 20.108581)):
            Circle(SKETCH003_R)
        with Locations((-25.795449, 20.108581)):
            Circle(SKETCH003_R)
        with Locations((27.131026, 20.108581)):
            Circle(SKETCH003_R)
        with Locations((80.0575, 20.108581)):
            Circle(SKETCH003_R)
        with Locations((-78.721924, -19.88926)):
            Circle(SKETCH003_R)
        with Locations((-25.795449, -19.88926)):
            Circle(SKETCH003_R)
        with Locations((27.131026, -19.88926)):
            Circle(SKETCH003_R)
        with Locations((80.0575, -19.88926)):
            Circle(SKETCH003_R)
    extrude(amount=PAD002_DEPTH)

    # Chamfer002
    chamfer002_edges = [part.edges().sort_by_distance(p)[0] for p in [
        (-63.437902, 15, 20.108581),
        (-63.437902, 15, -19.88926),
        (-10.511427, 15, -19.88926),
        (-10.511427, 15, 20.108581),
        (42.415048, 15, 20.108581),
        (42.415048, 15, -19.88926),
        (95.341523, 15, -19.88926),
        (95.341523, 15, 20.108581),
    ]]
    chamfer(chamfer002_edges, length=CHAMFER002_SIZE)

    # Chamfer003
    chamfer003_edges = [part.edges().sort_by_distance(p)[0] for p in [
        (-10.511427, 5, 20.108581),
        (-10.511427, 5, -19.88926),
        (42.415048, 5, -19.88926),
        (42.415048, 5, 20.108581),
        (95.341523, 5, -19.88926),
        (95.341523, 5, 20.108581),
        (-63.437902, 5, -19.88926),
        (-63.437902, 5, 20.108581),
    ]]
    chamfer(chamfer003_edges, length=CHAMFER003_SIZE)


solid = part.part
